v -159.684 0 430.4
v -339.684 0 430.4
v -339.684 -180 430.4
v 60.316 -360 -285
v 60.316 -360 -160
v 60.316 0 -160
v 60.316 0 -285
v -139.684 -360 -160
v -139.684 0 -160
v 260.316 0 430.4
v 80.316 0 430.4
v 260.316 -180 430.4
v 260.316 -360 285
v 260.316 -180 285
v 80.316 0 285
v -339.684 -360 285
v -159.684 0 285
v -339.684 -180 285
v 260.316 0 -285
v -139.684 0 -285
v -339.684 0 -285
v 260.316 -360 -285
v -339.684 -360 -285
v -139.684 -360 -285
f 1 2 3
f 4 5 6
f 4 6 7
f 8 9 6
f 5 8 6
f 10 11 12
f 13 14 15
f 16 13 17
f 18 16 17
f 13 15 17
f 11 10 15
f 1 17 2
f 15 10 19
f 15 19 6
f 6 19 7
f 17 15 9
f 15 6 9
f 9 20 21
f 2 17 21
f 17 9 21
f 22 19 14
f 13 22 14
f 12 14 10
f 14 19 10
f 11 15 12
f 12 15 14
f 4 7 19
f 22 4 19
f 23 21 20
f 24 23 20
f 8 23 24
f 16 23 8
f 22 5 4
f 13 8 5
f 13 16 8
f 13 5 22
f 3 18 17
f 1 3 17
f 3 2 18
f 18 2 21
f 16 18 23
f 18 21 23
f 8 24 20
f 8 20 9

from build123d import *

# Parameters (mm, degrees)
F1_DEPTH = 360
F3_DEPTH = 25.4
F4_DEPTH = 120


with BuildPart() as f1:
    # F0 (on Front) → F1 (new body)
    with BuildSketch(Plane.XZ):
        Polygon((260.316399, -285), (260.316399, 285), (-339.683601, 285), (-339.683601, -285), (-139.683601, -285), (-139.683601, -160), (60.316399, -160), (60.316399, -285), align=None)
    extrude(amount=F1_DEPTH)

    # F2 (on face) → F3 (join)
    with BuildSketch(Plane.XY.offset(285)):
        Polygon((-159.683601, 0), (-339.683601, 0), (-339.683601, -180), align=None)
        Polygon((260.316399, 0), (80.316399, 0), (260.316399, -180), align=None)
    extrude(amount=F3_DEPTH)

    # F3_face (on face) → F4 (join)
    with BuildSketch(Plane(origin=(-279.683601, -60, 310.4), x_dir=(1, 0, 0), z_dir=(0, 0, 1))):
        Polygon((-60, -120), (120, 60), (-60, 60), align=None)
        Polygon((540, 60), (360, 60), (540, -120), align=None)
    extrude(amount=F4_DEPTH)


solid = f1.part
